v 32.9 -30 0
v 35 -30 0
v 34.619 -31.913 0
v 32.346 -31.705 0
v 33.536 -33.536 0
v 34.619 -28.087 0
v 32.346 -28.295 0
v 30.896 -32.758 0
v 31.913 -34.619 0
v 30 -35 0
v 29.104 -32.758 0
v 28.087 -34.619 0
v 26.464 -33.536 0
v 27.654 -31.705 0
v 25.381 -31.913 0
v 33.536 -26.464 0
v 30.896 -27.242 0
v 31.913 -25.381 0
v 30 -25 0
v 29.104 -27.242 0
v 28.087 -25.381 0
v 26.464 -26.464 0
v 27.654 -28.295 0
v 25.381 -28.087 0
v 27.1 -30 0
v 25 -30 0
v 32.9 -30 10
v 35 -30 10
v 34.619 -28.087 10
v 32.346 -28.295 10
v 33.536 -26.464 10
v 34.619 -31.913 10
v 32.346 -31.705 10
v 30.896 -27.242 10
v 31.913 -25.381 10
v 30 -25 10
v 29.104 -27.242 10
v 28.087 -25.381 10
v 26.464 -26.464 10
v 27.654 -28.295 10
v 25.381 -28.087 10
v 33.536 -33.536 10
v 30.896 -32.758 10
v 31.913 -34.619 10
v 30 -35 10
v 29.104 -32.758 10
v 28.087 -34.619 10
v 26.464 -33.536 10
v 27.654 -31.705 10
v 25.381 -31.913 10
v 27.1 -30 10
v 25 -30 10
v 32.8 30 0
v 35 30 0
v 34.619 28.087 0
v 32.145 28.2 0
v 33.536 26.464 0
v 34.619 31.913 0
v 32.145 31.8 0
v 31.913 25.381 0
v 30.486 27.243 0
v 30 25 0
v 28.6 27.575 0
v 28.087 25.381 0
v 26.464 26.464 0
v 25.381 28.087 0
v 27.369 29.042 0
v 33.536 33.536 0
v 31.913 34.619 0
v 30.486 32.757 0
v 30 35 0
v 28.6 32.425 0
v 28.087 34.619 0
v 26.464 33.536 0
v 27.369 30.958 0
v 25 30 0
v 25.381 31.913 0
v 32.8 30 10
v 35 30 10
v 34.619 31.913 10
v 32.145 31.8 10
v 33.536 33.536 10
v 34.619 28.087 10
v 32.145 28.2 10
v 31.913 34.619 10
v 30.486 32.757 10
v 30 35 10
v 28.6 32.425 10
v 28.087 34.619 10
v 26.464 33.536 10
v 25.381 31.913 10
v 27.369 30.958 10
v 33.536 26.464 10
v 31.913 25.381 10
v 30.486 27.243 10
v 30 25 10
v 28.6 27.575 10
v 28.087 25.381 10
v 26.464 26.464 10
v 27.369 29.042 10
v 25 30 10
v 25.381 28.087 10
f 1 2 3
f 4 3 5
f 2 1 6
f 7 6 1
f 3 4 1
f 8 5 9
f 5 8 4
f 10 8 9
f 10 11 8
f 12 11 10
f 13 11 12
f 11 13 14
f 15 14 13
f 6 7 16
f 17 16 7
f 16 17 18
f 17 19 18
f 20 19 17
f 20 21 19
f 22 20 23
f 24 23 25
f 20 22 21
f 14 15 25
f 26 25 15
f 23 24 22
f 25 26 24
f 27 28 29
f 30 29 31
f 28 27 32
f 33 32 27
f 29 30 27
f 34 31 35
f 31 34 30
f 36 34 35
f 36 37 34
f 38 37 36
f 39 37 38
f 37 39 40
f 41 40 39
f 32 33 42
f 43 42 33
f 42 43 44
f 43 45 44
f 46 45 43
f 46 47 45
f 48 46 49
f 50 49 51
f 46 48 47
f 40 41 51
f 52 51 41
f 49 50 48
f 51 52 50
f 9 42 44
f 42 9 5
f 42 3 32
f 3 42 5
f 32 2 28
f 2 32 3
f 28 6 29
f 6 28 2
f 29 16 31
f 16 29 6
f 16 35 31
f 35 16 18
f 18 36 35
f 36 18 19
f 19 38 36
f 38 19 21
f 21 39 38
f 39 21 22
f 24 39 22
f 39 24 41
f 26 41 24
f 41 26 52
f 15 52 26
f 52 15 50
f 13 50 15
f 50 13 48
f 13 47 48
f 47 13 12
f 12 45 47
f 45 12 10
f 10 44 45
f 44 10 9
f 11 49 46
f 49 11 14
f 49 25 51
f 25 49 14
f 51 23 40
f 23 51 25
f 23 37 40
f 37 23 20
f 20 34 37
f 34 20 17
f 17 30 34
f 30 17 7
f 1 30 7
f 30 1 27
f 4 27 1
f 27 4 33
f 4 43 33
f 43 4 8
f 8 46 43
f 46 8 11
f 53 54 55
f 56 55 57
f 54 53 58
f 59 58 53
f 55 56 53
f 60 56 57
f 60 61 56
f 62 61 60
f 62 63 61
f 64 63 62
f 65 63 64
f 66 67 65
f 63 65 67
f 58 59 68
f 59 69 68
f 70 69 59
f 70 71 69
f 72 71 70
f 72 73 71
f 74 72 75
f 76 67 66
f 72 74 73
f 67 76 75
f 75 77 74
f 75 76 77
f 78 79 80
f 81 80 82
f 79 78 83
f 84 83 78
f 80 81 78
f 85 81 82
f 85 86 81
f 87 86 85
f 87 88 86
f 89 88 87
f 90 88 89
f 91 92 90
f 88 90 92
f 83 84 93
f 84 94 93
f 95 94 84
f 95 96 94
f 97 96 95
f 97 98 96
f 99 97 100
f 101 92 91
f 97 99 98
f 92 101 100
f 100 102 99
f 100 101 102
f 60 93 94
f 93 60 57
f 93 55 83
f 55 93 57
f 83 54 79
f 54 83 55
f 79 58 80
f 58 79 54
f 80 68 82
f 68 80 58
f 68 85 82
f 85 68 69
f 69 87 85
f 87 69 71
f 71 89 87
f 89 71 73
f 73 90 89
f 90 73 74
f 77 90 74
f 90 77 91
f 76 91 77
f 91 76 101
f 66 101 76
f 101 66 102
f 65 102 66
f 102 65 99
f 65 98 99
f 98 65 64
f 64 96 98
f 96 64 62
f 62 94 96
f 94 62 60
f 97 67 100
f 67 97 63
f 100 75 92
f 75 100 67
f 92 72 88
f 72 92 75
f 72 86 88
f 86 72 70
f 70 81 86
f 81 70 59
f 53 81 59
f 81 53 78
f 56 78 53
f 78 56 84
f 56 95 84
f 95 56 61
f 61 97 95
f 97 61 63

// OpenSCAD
lng = 200;
wd = 16;
r = 4;

// 5 doesn't fit in a hole that's 5.1
// 5, 3 can be a cover for screw
// a hole of radius 2.9 seems perfect for the screws we have

/*
translate([0, -30])
linear_extrude(height=5) {
  difference() {
    circle(r=7);
    circle(r=5.1);
  }
}
*/

translate([30, -30]) {
  linear_extrude(height=10) {
    difference() {
      circle(r=5);
      circle(r=2.9);
    }
  }
  //translate([0,0,10])
  //cylinder(h=2, r1=5, r2=4);
}

translate([30, 30]) {
  linear_extrude(height=10) {
    difference() {
      circle(r=5);
      circle(r=2.8);
    }
  }
  //translate([0,0,10])
  //cylinder(h=2, r1=5, r2=4);
}

module pin(center_x, center_y) {
  translate([center_x, center_y, 0]) {
    cylinder(h=20, r=r, center=false);
    translate([0,0,20]) cylinder(h=2, r1=r, r2=r-1, center=false);
  }
}

module hole(center_x, center_y) {
  translate([center_x, center_y, 0]) {
    cylinder(h=40, r=r+0.1, center=true);
  }
}

/*
translate([0, 20])
linear_extrude(height=5) {
  difference() {
    union() {
      square([lng, wd], center=true);
      translate([lng/2, 0]) circle(wd/2, center=true);
      translate([-lng/2, 0]) circle(wd/2, center=true);
    }
  //circle(r);
  //translate([lng/2, 0]) circle(r);
  //translate([-lng/2, 0]) circle(r);
    hole(0, 0);
    hole(lng/2, 0);
    hole(-lng/2, 0);
  }
}
*/
/*
union() {
  linear_extrude(height=5) {
    union() {
      square([lng, wd], center=true);
      translate([lng/2, 0]) circle(wd/2, center=true);
      translate([-lng/2, 0]) circle(wd/2, center=true);
    }
  }
  pin(0, 0);
  pin(lng/2, 0);
  pin(-lng/2, 0);
  //cylinder(h=20, r=r);
  //translate([lng/2, 0]) cylinder(h=20, r=r);
  //translate([-lng/2, 0]) cylinder(h=20, r=r);
}
*/
